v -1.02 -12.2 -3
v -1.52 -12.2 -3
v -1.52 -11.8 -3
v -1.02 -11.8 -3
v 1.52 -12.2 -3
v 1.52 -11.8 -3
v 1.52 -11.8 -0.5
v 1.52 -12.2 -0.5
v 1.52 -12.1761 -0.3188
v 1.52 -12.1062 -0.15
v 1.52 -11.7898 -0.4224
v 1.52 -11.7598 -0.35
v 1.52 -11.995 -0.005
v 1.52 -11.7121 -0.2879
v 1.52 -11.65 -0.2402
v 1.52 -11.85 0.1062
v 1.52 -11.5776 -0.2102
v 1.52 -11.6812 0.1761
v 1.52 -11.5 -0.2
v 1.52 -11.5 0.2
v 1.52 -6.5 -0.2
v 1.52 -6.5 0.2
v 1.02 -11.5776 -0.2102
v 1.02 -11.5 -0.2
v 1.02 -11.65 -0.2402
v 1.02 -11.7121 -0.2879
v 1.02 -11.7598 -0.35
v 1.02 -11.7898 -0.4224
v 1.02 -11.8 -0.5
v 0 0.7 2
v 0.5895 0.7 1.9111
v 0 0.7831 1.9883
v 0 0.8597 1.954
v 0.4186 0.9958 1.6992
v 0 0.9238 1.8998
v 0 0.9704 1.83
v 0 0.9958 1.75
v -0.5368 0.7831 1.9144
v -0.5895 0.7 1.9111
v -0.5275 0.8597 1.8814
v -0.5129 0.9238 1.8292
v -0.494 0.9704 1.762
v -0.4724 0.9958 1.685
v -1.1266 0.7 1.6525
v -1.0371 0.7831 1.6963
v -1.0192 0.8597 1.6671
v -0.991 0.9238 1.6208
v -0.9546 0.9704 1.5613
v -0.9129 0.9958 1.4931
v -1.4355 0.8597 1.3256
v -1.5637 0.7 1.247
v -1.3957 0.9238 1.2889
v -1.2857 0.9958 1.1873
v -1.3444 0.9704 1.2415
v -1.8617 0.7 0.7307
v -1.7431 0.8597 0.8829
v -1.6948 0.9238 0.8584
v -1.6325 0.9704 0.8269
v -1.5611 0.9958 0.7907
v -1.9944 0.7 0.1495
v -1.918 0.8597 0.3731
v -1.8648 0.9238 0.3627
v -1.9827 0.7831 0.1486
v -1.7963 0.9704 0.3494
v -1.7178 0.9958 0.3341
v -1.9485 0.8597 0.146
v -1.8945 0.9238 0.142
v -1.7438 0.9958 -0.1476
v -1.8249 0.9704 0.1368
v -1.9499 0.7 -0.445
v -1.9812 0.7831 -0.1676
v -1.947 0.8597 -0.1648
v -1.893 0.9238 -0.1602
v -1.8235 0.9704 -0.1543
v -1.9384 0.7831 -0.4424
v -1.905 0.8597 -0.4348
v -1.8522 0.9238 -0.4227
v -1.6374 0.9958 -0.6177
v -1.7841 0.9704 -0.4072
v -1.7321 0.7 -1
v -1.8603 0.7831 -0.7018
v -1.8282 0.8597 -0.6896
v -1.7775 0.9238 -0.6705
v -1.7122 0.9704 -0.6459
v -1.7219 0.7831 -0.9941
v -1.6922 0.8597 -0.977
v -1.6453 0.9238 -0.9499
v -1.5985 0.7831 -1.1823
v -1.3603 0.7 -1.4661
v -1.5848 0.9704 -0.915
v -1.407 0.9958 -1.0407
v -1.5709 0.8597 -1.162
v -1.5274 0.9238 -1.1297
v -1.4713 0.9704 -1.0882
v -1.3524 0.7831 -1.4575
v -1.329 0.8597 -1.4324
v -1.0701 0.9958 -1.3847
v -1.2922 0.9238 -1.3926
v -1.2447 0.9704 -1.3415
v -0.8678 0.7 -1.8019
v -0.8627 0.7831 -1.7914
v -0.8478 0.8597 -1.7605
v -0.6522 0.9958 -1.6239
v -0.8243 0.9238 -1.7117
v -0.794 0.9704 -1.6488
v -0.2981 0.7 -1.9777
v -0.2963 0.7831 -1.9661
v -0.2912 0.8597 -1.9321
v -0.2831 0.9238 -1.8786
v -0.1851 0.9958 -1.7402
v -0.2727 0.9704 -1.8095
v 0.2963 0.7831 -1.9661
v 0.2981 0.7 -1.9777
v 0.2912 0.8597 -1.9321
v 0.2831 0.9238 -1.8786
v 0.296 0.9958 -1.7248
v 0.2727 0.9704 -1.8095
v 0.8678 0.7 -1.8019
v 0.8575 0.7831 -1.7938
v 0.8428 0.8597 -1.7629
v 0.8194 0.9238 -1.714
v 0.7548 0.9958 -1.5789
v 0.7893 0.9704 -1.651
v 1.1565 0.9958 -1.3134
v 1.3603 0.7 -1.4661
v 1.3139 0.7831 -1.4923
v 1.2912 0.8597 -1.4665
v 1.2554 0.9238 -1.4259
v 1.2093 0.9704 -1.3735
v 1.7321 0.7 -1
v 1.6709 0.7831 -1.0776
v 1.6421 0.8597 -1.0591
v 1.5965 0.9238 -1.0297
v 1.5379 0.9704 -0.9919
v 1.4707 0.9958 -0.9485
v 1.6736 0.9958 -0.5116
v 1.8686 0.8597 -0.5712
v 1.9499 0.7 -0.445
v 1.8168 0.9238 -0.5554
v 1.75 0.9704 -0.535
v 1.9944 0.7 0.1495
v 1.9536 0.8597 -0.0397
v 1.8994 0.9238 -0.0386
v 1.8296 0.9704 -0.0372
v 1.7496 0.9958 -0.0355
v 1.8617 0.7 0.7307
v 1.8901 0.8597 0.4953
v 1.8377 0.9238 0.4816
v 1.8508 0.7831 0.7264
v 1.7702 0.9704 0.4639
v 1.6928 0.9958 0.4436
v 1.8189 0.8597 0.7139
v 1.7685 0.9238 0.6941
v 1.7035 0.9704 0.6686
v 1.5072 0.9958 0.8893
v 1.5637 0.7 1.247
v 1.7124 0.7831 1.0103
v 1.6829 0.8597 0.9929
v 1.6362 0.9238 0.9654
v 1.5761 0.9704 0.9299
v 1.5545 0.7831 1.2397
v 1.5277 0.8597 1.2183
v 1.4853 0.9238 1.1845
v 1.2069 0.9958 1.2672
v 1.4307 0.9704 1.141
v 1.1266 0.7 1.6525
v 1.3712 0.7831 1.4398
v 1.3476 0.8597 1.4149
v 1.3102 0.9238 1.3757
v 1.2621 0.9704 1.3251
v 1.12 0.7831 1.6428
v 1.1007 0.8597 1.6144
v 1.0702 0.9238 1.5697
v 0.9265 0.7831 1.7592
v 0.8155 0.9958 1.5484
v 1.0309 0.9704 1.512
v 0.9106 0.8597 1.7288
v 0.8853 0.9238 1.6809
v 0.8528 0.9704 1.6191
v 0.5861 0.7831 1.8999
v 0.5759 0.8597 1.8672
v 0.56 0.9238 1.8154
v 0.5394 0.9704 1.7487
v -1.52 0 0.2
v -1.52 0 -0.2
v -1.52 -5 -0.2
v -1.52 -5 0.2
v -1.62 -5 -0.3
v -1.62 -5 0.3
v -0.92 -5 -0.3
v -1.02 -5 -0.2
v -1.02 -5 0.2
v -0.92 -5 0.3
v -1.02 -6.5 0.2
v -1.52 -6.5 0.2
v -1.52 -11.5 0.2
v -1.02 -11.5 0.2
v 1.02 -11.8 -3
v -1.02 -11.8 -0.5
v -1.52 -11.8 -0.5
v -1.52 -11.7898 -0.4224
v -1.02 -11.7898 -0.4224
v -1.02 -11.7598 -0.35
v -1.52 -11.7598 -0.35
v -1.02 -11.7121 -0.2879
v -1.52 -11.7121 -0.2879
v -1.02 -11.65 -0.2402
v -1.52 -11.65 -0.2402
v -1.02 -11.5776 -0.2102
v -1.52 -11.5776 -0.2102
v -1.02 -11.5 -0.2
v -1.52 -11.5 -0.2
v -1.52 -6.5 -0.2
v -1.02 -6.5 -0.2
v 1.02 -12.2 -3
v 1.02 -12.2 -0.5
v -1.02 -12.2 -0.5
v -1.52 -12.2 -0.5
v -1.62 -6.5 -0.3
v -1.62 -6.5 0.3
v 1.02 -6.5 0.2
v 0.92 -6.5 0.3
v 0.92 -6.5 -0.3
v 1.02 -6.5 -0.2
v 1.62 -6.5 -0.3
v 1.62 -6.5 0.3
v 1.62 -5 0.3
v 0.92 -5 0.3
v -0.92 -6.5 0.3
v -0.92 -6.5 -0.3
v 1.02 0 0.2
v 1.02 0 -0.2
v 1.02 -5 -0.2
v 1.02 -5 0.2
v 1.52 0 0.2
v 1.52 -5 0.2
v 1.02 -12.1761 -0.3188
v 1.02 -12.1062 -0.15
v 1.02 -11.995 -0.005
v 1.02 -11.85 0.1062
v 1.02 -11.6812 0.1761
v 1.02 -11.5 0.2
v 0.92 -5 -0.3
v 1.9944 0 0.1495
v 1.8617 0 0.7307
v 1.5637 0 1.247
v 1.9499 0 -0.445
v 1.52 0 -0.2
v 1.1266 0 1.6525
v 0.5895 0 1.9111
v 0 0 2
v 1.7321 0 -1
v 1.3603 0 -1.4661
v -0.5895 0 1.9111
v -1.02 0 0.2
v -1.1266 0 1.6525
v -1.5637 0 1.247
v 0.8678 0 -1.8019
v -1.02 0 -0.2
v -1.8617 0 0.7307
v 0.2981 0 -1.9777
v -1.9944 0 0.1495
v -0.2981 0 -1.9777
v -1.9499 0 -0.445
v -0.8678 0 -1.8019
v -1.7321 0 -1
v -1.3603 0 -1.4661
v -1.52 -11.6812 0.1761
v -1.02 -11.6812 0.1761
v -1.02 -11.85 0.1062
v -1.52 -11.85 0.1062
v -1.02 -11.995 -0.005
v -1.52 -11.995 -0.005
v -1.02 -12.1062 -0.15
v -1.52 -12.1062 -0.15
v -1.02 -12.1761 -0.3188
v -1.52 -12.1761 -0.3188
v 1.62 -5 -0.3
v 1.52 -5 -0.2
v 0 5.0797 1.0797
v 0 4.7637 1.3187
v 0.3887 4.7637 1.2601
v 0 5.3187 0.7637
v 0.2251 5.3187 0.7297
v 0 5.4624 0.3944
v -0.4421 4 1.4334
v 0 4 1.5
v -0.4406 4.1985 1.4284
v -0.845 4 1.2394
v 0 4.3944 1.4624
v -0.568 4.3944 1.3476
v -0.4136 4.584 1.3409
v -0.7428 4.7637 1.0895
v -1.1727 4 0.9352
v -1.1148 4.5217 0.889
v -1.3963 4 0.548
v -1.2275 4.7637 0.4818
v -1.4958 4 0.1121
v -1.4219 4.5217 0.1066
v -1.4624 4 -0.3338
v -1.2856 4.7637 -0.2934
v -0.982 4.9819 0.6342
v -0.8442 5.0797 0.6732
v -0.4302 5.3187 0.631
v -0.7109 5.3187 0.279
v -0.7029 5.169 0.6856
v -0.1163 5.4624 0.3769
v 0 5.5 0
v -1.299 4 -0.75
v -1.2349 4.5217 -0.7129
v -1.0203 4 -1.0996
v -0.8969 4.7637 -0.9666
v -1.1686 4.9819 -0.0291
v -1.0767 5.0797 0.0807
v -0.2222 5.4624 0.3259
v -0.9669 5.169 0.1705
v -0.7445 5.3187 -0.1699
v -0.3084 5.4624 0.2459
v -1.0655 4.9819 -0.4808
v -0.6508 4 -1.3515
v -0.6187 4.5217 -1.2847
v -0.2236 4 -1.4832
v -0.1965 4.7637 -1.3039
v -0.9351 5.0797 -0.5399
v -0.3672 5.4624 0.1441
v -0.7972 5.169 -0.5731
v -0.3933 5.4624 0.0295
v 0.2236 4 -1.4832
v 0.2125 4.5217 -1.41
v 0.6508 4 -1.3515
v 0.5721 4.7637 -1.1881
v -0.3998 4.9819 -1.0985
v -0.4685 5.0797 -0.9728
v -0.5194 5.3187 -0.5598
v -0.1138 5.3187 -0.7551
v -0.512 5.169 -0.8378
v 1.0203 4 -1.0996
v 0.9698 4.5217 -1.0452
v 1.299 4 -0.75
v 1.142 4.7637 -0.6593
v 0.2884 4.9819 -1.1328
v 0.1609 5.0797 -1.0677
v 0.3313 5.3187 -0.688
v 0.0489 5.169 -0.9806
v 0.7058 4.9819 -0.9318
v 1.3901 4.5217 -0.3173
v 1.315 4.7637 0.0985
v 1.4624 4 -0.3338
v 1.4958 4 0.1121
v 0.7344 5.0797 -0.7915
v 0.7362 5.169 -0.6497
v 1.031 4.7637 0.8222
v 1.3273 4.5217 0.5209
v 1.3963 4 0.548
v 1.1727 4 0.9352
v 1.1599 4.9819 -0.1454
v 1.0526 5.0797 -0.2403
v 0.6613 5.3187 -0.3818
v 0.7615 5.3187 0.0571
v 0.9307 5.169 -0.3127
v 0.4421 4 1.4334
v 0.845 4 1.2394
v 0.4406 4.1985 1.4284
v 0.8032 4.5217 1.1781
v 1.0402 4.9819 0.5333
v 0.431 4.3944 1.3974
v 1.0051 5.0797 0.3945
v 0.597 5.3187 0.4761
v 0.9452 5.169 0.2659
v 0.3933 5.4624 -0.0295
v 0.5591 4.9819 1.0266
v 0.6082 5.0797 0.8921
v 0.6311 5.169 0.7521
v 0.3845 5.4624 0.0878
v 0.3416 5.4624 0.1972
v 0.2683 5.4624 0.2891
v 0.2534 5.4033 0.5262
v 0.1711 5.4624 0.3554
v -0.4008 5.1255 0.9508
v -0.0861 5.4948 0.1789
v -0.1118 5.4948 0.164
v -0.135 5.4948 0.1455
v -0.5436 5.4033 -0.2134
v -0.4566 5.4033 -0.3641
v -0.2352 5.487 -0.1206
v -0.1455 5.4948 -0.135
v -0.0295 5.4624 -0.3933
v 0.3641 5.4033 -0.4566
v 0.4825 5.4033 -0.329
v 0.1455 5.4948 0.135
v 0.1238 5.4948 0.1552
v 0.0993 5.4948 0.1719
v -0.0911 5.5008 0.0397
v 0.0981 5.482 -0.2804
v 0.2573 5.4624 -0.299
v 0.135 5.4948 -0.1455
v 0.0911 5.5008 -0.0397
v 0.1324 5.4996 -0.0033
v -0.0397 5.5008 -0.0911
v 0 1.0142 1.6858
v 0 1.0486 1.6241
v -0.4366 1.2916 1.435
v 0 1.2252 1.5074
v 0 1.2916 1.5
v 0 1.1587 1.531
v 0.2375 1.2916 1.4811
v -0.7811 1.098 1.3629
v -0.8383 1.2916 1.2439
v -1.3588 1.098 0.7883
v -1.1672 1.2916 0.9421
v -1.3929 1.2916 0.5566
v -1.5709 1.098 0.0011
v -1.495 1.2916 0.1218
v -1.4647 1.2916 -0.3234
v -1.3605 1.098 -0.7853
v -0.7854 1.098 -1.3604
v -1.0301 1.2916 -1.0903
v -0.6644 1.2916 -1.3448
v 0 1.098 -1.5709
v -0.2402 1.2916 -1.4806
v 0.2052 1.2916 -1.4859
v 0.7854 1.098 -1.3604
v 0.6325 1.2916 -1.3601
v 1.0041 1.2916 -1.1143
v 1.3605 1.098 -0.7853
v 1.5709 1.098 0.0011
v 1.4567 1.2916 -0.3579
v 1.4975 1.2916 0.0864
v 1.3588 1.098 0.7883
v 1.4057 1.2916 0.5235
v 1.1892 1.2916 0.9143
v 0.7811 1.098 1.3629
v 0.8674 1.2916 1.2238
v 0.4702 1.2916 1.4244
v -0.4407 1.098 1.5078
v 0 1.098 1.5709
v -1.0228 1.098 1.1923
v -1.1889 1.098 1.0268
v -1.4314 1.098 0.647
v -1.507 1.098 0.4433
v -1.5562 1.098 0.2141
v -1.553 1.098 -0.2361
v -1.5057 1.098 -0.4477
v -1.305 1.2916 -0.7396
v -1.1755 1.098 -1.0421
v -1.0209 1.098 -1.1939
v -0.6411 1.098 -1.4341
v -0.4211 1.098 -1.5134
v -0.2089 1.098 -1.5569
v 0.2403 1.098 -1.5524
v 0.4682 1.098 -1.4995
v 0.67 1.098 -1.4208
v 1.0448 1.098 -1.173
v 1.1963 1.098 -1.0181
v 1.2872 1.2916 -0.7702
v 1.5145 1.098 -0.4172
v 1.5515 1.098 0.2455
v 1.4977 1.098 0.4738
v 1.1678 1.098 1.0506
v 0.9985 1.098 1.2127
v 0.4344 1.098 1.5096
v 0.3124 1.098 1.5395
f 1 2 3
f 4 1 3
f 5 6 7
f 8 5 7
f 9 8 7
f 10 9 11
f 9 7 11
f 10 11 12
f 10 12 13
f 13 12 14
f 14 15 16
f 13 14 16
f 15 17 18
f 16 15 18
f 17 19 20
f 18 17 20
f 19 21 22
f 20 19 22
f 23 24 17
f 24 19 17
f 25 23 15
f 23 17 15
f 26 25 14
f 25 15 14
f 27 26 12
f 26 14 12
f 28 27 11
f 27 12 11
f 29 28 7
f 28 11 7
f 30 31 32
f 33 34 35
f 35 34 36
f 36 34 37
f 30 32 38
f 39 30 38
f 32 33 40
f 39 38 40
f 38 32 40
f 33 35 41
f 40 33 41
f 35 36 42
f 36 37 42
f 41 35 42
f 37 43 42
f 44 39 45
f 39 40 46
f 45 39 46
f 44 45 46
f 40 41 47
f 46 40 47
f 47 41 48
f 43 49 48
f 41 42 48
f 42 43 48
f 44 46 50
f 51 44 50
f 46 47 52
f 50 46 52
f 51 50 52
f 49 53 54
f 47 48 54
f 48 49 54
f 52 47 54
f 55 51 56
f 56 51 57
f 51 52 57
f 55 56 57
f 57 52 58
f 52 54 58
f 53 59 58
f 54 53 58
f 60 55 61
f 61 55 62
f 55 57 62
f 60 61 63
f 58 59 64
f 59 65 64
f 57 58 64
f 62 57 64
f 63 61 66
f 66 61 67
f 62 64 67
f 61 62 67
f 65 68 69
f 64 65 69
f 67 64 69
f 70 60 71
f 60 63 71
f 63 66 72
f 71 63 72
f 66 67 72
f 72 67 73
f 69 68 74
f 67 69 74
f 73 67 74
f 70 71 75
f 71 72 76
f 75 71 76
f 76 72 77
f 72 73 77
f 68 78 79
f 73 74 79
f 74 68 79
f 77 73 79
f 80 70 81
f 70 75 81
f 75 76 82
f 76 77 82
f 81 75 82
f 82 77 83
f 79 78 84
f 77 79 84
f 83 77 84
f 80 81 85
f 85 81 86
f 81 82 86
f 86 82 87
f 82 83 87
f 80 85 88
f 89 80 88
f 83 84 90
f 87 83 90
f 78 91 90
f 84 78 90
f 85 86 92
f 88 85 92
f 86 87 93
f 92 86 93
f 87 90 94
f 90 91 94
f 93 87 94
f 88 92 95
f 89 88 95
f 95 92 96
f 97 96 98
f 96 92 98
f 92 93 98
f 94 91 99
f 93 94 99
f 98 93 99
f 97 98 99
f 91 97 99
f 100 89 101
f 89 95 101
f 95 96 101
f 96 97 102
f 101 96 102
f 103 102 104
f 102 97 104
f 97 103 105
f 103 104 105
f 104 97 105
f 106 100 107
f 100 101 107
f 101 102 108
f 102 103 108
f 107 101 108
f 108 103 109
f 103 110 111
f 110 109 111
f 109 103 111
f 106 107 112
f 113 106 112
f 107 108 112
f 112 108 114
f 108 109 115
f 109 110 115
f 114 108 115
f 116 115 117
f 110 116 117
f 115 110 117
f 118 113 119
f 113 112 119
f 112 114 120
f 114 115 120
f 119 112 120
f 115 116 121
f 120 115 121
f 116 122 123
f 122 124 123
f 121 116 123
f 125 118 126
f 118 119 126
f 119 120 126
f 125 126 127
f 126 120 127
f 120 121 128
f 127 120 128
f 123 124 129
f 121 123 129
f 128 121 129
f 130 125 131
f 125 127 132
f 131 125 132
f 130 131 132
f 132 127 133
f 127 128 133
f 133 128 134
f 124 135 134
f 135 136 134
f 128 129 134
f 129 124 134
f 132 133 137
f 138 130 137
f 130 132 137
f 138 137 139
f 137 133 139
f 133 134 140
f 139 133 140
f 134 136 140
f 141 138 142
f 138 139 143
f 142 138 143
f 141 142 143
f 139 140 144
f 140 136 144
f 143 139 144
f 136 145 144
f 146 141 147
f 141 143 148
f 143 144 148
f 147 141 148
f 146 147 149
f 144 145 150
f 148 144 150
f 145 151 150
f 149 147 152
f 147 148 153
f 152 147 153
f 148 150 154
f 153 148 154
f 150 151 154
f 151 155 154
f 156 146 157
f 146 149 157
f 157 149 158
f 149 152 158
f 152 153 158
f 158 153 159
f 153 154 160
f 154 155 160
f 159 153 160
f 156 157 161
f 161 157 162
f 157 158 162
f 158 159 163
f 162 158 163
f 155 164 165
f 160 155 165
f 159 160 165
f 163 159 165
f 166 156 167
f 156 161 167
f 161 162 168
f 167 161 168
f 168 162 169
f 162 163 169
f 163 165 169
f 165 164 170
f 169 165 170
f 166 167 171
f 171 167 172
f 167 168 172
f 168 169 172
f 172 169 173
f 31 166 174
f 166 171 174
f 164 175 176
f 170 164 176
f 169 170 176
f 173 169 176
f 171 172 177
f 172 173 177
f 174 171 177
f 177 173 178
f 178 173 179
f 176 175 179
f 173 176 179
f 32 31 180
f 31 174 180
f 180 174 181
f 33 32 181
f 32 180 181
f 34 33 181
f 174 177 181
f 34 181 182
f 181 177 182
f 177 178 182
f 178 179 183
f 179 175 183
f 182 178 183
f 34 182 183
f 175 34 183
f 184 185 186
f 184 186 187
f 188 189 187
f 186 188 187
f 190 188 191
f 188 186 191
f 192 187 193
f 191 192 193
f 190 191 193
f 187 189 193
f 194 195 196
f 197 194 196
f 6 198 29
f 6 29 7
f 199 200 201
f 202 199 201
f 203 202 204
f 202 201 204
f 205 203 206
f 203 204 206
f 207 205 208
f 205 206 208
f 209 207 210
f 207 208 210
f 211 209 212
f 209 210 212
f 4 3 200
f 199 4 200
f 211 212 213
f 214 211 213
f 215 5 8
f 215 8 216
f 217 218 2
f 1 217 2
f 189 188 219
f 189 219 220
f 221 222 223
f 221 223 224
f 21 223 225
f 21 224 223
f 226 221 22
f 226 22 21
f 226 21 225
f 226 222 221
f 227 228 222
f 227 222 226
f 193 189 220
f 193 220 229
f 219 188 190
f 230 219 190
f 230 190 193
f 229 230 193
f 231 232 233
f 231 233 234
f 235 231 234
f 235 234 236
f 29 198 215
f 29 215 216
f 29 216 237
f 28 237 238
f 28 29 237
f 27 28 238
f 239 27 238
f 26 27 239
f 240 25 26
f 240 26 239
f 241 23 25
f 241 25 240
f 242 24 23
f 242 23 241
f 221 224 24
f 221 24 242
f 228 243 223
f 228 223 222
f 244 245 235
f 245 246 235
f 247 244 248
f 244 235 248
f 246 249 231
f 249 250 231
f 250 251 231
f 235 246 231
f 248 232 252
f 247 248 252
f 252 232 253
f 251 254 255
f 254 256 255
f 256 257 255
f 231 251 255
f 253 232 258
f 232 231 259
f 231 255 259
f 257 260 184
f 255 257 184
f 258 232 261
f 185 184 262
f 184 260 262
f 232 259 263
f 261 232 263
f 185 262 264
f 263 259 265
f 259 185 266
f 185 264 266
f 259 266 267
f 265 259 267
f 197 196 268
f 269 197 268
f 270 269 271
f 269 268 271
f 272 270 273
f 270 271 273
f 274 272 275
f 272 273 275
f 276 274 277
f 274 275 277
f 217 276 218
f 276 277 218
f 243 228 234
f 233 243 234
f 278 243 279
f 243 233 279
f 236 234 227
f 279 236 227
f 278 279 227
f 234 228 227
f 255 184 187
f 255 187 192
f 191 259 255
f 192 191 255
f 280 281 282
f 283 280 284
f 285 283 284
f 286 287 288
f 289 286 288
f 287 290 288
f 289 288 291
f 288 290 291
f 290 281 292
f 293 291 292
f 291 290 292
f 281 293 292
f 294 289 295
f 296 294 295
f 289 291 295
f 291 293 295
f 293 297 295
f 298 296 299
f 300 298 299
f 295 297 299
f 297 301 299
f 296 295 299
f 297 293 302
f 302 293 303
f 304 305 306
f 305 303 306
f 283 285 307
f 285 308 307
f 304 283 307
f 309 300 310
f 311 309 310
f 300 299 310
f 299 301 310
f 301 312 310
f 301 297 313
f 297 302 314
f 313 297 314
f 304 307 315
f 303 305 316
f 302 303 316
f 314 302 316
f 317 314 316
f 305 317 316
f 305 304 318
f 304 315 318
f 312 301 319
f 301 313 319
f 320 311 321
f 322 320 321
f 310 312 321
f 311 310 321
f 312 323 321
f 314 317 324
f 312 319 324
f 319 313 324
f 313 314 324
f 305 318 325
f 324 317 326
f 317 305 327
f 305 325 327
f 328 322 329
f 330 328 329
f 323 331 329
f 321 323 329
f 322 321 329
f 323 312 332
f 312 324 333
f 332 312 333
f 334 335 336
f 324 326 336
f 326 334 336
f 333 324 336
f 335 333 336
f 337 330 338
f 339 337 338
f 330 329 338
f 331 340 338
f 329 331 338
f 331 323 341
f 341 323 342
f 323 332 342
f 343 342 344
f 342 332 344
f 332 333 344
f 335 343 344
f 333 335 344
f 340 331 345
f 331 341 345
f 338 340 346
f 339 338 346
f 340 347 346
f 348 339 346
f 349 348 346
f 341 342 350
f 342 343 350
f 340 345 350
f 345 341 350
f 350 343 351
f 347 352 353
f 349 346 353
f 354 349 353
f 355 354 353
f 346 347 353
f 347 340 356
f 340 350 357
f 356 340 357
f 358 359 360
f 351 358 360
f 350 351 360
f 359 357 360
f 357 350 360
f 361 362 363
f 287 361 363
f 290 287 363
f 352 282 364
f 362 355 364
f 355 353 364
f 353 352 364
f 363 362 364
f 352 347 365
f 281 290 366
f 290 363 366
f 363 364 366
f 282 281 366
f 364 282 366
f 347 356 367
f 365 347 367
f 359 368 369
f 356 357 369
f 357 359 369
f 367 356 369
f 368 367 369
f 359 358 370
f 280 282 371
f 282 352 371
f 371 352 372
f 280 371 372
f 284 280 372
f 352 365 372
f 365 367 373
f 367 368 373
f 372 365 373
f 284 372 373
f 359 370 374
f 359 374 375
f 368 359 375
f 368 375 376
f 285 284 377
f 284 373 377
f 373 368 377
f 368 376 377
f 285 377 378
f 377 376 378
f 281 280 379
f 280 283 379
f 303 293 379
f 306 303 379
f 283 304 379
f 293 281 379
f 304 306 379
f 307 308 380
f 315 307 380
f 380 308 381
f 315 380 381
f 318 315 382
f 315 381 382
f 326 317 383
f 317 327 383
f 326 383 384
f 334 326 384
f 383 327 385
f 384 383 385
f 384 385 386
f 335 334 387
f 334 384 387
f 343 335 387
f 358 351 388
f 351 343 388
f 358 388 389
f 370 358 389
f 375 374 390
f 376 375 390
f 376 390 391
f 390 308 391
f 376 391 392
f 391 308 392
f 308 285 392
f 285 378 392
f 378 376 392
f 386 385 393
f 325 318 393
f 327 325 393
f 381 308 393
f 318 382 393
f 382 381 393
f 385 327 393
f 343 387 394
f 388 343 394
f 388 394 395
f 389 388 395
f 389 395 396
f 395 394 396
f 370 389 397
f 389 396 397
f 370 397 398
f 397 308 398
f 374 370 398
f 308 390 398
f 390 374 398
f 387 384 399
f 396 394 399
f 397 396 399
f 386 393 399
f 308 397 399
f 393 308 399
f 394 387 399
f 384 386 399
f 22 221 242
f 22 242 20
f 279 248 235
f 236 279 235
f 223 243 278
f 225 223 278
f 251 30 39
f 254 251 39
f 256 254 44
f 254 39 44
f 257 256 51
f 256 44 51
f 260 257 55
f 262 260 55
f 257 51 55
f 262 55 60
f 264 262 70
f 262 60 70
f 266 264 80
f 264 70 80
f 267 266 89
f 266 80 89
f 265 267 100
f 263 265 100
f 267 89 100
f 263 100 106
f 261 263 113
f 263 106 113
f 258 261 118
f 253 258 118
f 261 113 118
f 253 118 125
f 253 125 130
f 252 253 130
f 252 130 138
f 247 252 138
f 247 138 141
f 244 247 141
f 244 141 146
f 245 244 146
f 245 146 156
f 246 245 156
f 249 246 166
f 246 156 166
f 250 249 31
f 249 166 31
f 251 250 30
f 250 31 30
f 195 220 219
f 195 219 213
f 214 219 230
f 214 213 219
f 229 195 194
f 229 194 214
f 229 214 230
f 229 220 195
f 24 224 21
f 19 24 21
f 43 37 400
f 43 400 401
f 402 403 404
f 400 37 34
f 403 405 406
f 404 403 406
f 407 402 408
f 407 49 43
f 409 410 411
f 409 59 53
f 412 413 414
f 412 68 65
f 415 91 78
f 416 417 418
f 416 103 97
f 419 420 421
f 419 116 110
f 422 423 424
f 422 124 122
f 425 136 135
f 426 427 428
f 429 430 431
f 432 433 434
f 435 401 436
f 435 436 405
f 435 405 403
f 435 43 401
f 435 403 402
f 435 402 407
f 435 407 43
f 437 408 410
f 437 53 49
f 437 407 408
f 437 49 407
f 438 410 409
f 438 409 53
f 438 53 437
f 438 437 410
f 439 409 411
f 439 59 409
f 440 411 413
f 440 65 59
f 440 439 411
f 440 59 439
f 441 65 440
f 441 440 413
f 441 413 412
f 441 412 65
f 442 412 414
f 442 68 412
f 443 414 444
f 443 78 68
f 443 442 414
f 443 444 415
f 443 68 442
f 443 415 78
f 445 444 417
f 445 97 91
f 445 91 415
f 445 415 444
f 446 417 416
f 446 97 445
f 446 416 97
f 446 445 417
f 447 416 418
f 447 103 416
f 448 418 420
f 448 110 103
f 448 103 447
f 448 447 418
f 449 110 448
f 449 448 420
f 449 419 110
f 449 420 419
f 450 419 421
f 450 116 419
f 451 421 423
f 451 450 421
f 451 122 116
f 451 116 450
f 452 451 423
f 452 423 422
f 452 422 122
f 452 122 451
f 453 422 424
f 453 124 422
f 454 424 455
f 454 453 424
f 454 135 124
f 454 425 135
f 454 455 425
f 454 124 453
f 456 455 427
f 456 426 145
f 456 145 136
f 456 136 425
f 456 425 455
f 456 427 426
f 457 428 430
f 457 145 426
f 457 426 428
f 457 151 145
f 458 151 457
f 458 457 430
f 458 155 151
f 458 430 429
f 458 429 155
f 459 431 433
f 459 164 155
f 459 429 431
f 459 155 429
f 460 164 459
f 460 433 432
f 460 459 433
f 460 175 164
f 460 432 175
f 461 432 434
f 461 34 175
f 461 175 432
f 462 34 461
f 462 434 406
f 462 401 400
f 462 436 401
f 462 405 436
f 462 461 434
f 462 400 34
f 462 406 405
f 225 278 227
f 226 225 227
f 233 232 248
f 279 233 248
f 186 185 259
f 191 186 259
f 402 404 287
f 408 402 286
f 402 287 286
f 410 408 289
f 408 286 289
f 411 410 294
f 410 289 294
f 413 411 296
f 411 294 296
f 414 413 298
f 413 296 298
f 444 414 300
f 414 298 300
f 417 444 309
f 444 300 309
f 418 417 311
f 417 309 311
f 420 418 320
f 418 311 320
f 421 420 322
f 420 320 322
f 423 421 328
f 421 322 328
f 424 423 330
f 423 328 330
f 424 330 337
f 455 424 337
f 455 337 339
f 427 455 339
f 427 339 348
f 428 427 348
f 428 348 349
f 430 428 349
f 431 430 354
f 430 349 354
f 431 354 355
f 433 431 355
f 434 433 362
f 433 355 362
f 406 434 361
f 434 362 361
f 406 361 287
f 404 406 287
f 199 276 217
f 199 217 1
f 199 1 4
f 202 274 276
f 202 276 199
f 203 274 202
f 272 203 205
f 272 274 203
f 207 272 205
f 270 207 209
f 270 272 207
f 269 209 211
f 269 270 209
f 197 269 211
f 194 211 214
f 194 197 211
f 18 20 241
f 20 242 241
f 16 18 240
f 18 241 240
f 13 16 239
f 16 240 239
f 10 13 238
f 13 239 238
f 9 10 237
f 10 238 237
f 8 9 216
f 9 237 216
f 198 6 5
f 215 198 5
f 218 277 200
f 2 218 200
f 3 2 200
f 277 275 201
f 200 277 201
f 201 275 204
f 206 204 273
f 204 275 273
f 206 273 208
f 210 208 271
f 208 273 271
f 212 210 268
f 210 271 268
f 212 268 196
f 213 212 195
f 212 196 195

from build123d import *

# Parameters (mm, degrees)
FILLET_1_R      = 0.3
FILLET_2_R      = 0.3
SKETCH_2_W      = 0.5
SKETCH_2_H      = 0.4
EXTRUDE_1_DEPTH = 5
SKETCH_3_W      = 0.7
SKETCH_3_H      = 0.6
EXTRUDE_2_DEPTH = 1.5
SKETCH_5_W      = 0.5
SKETCH_5_H      = 0.4
EXTRUDE_3_DEPTH = 4.5
SWEEP_START     = -1.52
SWEEP_2_DEPTH   = 0.5
SKETCH_7_262_W  = 0.5
SKETCH_7_262_H  = 0.4


# Read off the part's stored shape, not the designer's step: По траектории2
with BuildPart() as part:
    # Эскиз1 → Повернуть2 (revolve)
    with BuildSketch(Plane(origin=(0, 0, 0), x_dir=(0, 0, -1), z_dir=(1, 0, 0))):
        with BuildLine():
            Line((0, 0), (-2, 0))
            Line((-2, 0), (-2, 1))
            Line((-2, 1), (-1.5, 1))
            Line((-1.5, 1), (-1.5, 4))
            ThreePointArc((-1.5, 4), (-1.07971355, 5.07971355), (0, 5.5))
            Line((0, 5.5), (0, 0))
        make_face()
    revolve(axis=Axis((0, 5.5, 0), (0, -1, 0)))

    # Скругление1
    fillet_1_edges = [part.edges().sort_by_distance(p)[0] for p in [
        (0, 1, -2),
    ]]
    fillet(fillet_1_edges, radius=FILLET_1_R)

    # Скругление2
    fillet_2_edges = [part.edges().sort_by_distance(p)[0] for p in [
        (0, 1, -1.5),
    ]]
    fillet(fillet_2_edges, radius=FILLET_2_R)

    # Эскиз2 → Вытянуть1 (add)
    with BuildSketch(Plane.XZ):
        with Locations((-1.27, 0)):
            Rectangle(SKETCH_2_W, SKETCH_2_H)
        with Locations((1.27, 0)):
            Rectangle(SKETCH_2_W, SKETCH_2_H)
    extrude(amount=EXTRUDE_1_DEPTH)

    # Эскиз3 → Вытянуть2 (add)
    with BuildSketch(Plane.XZ.offset(5)):
        with Locations((-1.27, 0)):
            Rectangle(SKETCH_3_W, SKETCH_3_H)
        with Locations((1.27, 0)):
            Rectangle(SKETCH_3_W, SKETCH_3_H)
    extrude(amount=EXTRUDE_2_DEPTH)

    # Эскиз5 → Вытянуть3 (add)
    with BuildSketch(Plane.XZ.offset(6.5)):
        with Locations((-1.27, 0)):
            Rectangle(SKETCH_5_W, SKETCH_5_H)
        with Locations((1.27, 0)):
            Rectangle(SKETCH_5_W, SKETCH_5_H)
    extrude(amount=EXTRUDE_3_DEPTH)

    # По траектории2 outline → По траектории2 (add)
    with BuildSketch(Plane.YZ.offset(SWEEP_START)):
        with BuildLine():
            Line((-11.5, -0.2), (-11, -0.2))
            Line((-11, -0.2), (-11, 0.2))
            Line((-11, 0.2), (-11.5, 0.2))
            ThreePointArc((-11.5, 0.2), (-11.994974747, -0.005025253), (-12.2, -0.5))
            Line((-12.2, -0.5), (-12.2, -3))
            Line((-12.2, -3), (-11.8, -3))
            Line((-11.8, -3), (-11.8, -0.5))
            ThreePointArc((-11.8, -0.5), (-11.712132034, -0.287867966), (-11.5, -0.2))
        make_face()
    extrude(amount=SWEEP_2_DEPTH)

    # По траектории11: sweep along a curve in space
    with BuildLine() as sweep_11_path:
        Line((-1.27, -11, 0), (-1.27, -11.5, 0))
        ThreePointArc((-1.27, -11.5, 0), (-1.27, -11.853553391, -0.146446609), (-1.27, -12, -0.5))
        Line((-1.27, -12, -0.5), (-1.27, -12, -3))
    # Эскиз7<262> → По траектории11 (sweep)
    with BuildSketch(Plane.XZ.offset(11)):
        with Locations((-1.27, 0)):
            Rectangle(SKETCH_7_262_W, SKETCH_7_262_H)
        with Locations((1.27, 0)):
            Rectangle(SKETCH_7_262_W, SKETCH_7_262_H)
    sweep(path=sweep_11_path.line)


solid = part.part
